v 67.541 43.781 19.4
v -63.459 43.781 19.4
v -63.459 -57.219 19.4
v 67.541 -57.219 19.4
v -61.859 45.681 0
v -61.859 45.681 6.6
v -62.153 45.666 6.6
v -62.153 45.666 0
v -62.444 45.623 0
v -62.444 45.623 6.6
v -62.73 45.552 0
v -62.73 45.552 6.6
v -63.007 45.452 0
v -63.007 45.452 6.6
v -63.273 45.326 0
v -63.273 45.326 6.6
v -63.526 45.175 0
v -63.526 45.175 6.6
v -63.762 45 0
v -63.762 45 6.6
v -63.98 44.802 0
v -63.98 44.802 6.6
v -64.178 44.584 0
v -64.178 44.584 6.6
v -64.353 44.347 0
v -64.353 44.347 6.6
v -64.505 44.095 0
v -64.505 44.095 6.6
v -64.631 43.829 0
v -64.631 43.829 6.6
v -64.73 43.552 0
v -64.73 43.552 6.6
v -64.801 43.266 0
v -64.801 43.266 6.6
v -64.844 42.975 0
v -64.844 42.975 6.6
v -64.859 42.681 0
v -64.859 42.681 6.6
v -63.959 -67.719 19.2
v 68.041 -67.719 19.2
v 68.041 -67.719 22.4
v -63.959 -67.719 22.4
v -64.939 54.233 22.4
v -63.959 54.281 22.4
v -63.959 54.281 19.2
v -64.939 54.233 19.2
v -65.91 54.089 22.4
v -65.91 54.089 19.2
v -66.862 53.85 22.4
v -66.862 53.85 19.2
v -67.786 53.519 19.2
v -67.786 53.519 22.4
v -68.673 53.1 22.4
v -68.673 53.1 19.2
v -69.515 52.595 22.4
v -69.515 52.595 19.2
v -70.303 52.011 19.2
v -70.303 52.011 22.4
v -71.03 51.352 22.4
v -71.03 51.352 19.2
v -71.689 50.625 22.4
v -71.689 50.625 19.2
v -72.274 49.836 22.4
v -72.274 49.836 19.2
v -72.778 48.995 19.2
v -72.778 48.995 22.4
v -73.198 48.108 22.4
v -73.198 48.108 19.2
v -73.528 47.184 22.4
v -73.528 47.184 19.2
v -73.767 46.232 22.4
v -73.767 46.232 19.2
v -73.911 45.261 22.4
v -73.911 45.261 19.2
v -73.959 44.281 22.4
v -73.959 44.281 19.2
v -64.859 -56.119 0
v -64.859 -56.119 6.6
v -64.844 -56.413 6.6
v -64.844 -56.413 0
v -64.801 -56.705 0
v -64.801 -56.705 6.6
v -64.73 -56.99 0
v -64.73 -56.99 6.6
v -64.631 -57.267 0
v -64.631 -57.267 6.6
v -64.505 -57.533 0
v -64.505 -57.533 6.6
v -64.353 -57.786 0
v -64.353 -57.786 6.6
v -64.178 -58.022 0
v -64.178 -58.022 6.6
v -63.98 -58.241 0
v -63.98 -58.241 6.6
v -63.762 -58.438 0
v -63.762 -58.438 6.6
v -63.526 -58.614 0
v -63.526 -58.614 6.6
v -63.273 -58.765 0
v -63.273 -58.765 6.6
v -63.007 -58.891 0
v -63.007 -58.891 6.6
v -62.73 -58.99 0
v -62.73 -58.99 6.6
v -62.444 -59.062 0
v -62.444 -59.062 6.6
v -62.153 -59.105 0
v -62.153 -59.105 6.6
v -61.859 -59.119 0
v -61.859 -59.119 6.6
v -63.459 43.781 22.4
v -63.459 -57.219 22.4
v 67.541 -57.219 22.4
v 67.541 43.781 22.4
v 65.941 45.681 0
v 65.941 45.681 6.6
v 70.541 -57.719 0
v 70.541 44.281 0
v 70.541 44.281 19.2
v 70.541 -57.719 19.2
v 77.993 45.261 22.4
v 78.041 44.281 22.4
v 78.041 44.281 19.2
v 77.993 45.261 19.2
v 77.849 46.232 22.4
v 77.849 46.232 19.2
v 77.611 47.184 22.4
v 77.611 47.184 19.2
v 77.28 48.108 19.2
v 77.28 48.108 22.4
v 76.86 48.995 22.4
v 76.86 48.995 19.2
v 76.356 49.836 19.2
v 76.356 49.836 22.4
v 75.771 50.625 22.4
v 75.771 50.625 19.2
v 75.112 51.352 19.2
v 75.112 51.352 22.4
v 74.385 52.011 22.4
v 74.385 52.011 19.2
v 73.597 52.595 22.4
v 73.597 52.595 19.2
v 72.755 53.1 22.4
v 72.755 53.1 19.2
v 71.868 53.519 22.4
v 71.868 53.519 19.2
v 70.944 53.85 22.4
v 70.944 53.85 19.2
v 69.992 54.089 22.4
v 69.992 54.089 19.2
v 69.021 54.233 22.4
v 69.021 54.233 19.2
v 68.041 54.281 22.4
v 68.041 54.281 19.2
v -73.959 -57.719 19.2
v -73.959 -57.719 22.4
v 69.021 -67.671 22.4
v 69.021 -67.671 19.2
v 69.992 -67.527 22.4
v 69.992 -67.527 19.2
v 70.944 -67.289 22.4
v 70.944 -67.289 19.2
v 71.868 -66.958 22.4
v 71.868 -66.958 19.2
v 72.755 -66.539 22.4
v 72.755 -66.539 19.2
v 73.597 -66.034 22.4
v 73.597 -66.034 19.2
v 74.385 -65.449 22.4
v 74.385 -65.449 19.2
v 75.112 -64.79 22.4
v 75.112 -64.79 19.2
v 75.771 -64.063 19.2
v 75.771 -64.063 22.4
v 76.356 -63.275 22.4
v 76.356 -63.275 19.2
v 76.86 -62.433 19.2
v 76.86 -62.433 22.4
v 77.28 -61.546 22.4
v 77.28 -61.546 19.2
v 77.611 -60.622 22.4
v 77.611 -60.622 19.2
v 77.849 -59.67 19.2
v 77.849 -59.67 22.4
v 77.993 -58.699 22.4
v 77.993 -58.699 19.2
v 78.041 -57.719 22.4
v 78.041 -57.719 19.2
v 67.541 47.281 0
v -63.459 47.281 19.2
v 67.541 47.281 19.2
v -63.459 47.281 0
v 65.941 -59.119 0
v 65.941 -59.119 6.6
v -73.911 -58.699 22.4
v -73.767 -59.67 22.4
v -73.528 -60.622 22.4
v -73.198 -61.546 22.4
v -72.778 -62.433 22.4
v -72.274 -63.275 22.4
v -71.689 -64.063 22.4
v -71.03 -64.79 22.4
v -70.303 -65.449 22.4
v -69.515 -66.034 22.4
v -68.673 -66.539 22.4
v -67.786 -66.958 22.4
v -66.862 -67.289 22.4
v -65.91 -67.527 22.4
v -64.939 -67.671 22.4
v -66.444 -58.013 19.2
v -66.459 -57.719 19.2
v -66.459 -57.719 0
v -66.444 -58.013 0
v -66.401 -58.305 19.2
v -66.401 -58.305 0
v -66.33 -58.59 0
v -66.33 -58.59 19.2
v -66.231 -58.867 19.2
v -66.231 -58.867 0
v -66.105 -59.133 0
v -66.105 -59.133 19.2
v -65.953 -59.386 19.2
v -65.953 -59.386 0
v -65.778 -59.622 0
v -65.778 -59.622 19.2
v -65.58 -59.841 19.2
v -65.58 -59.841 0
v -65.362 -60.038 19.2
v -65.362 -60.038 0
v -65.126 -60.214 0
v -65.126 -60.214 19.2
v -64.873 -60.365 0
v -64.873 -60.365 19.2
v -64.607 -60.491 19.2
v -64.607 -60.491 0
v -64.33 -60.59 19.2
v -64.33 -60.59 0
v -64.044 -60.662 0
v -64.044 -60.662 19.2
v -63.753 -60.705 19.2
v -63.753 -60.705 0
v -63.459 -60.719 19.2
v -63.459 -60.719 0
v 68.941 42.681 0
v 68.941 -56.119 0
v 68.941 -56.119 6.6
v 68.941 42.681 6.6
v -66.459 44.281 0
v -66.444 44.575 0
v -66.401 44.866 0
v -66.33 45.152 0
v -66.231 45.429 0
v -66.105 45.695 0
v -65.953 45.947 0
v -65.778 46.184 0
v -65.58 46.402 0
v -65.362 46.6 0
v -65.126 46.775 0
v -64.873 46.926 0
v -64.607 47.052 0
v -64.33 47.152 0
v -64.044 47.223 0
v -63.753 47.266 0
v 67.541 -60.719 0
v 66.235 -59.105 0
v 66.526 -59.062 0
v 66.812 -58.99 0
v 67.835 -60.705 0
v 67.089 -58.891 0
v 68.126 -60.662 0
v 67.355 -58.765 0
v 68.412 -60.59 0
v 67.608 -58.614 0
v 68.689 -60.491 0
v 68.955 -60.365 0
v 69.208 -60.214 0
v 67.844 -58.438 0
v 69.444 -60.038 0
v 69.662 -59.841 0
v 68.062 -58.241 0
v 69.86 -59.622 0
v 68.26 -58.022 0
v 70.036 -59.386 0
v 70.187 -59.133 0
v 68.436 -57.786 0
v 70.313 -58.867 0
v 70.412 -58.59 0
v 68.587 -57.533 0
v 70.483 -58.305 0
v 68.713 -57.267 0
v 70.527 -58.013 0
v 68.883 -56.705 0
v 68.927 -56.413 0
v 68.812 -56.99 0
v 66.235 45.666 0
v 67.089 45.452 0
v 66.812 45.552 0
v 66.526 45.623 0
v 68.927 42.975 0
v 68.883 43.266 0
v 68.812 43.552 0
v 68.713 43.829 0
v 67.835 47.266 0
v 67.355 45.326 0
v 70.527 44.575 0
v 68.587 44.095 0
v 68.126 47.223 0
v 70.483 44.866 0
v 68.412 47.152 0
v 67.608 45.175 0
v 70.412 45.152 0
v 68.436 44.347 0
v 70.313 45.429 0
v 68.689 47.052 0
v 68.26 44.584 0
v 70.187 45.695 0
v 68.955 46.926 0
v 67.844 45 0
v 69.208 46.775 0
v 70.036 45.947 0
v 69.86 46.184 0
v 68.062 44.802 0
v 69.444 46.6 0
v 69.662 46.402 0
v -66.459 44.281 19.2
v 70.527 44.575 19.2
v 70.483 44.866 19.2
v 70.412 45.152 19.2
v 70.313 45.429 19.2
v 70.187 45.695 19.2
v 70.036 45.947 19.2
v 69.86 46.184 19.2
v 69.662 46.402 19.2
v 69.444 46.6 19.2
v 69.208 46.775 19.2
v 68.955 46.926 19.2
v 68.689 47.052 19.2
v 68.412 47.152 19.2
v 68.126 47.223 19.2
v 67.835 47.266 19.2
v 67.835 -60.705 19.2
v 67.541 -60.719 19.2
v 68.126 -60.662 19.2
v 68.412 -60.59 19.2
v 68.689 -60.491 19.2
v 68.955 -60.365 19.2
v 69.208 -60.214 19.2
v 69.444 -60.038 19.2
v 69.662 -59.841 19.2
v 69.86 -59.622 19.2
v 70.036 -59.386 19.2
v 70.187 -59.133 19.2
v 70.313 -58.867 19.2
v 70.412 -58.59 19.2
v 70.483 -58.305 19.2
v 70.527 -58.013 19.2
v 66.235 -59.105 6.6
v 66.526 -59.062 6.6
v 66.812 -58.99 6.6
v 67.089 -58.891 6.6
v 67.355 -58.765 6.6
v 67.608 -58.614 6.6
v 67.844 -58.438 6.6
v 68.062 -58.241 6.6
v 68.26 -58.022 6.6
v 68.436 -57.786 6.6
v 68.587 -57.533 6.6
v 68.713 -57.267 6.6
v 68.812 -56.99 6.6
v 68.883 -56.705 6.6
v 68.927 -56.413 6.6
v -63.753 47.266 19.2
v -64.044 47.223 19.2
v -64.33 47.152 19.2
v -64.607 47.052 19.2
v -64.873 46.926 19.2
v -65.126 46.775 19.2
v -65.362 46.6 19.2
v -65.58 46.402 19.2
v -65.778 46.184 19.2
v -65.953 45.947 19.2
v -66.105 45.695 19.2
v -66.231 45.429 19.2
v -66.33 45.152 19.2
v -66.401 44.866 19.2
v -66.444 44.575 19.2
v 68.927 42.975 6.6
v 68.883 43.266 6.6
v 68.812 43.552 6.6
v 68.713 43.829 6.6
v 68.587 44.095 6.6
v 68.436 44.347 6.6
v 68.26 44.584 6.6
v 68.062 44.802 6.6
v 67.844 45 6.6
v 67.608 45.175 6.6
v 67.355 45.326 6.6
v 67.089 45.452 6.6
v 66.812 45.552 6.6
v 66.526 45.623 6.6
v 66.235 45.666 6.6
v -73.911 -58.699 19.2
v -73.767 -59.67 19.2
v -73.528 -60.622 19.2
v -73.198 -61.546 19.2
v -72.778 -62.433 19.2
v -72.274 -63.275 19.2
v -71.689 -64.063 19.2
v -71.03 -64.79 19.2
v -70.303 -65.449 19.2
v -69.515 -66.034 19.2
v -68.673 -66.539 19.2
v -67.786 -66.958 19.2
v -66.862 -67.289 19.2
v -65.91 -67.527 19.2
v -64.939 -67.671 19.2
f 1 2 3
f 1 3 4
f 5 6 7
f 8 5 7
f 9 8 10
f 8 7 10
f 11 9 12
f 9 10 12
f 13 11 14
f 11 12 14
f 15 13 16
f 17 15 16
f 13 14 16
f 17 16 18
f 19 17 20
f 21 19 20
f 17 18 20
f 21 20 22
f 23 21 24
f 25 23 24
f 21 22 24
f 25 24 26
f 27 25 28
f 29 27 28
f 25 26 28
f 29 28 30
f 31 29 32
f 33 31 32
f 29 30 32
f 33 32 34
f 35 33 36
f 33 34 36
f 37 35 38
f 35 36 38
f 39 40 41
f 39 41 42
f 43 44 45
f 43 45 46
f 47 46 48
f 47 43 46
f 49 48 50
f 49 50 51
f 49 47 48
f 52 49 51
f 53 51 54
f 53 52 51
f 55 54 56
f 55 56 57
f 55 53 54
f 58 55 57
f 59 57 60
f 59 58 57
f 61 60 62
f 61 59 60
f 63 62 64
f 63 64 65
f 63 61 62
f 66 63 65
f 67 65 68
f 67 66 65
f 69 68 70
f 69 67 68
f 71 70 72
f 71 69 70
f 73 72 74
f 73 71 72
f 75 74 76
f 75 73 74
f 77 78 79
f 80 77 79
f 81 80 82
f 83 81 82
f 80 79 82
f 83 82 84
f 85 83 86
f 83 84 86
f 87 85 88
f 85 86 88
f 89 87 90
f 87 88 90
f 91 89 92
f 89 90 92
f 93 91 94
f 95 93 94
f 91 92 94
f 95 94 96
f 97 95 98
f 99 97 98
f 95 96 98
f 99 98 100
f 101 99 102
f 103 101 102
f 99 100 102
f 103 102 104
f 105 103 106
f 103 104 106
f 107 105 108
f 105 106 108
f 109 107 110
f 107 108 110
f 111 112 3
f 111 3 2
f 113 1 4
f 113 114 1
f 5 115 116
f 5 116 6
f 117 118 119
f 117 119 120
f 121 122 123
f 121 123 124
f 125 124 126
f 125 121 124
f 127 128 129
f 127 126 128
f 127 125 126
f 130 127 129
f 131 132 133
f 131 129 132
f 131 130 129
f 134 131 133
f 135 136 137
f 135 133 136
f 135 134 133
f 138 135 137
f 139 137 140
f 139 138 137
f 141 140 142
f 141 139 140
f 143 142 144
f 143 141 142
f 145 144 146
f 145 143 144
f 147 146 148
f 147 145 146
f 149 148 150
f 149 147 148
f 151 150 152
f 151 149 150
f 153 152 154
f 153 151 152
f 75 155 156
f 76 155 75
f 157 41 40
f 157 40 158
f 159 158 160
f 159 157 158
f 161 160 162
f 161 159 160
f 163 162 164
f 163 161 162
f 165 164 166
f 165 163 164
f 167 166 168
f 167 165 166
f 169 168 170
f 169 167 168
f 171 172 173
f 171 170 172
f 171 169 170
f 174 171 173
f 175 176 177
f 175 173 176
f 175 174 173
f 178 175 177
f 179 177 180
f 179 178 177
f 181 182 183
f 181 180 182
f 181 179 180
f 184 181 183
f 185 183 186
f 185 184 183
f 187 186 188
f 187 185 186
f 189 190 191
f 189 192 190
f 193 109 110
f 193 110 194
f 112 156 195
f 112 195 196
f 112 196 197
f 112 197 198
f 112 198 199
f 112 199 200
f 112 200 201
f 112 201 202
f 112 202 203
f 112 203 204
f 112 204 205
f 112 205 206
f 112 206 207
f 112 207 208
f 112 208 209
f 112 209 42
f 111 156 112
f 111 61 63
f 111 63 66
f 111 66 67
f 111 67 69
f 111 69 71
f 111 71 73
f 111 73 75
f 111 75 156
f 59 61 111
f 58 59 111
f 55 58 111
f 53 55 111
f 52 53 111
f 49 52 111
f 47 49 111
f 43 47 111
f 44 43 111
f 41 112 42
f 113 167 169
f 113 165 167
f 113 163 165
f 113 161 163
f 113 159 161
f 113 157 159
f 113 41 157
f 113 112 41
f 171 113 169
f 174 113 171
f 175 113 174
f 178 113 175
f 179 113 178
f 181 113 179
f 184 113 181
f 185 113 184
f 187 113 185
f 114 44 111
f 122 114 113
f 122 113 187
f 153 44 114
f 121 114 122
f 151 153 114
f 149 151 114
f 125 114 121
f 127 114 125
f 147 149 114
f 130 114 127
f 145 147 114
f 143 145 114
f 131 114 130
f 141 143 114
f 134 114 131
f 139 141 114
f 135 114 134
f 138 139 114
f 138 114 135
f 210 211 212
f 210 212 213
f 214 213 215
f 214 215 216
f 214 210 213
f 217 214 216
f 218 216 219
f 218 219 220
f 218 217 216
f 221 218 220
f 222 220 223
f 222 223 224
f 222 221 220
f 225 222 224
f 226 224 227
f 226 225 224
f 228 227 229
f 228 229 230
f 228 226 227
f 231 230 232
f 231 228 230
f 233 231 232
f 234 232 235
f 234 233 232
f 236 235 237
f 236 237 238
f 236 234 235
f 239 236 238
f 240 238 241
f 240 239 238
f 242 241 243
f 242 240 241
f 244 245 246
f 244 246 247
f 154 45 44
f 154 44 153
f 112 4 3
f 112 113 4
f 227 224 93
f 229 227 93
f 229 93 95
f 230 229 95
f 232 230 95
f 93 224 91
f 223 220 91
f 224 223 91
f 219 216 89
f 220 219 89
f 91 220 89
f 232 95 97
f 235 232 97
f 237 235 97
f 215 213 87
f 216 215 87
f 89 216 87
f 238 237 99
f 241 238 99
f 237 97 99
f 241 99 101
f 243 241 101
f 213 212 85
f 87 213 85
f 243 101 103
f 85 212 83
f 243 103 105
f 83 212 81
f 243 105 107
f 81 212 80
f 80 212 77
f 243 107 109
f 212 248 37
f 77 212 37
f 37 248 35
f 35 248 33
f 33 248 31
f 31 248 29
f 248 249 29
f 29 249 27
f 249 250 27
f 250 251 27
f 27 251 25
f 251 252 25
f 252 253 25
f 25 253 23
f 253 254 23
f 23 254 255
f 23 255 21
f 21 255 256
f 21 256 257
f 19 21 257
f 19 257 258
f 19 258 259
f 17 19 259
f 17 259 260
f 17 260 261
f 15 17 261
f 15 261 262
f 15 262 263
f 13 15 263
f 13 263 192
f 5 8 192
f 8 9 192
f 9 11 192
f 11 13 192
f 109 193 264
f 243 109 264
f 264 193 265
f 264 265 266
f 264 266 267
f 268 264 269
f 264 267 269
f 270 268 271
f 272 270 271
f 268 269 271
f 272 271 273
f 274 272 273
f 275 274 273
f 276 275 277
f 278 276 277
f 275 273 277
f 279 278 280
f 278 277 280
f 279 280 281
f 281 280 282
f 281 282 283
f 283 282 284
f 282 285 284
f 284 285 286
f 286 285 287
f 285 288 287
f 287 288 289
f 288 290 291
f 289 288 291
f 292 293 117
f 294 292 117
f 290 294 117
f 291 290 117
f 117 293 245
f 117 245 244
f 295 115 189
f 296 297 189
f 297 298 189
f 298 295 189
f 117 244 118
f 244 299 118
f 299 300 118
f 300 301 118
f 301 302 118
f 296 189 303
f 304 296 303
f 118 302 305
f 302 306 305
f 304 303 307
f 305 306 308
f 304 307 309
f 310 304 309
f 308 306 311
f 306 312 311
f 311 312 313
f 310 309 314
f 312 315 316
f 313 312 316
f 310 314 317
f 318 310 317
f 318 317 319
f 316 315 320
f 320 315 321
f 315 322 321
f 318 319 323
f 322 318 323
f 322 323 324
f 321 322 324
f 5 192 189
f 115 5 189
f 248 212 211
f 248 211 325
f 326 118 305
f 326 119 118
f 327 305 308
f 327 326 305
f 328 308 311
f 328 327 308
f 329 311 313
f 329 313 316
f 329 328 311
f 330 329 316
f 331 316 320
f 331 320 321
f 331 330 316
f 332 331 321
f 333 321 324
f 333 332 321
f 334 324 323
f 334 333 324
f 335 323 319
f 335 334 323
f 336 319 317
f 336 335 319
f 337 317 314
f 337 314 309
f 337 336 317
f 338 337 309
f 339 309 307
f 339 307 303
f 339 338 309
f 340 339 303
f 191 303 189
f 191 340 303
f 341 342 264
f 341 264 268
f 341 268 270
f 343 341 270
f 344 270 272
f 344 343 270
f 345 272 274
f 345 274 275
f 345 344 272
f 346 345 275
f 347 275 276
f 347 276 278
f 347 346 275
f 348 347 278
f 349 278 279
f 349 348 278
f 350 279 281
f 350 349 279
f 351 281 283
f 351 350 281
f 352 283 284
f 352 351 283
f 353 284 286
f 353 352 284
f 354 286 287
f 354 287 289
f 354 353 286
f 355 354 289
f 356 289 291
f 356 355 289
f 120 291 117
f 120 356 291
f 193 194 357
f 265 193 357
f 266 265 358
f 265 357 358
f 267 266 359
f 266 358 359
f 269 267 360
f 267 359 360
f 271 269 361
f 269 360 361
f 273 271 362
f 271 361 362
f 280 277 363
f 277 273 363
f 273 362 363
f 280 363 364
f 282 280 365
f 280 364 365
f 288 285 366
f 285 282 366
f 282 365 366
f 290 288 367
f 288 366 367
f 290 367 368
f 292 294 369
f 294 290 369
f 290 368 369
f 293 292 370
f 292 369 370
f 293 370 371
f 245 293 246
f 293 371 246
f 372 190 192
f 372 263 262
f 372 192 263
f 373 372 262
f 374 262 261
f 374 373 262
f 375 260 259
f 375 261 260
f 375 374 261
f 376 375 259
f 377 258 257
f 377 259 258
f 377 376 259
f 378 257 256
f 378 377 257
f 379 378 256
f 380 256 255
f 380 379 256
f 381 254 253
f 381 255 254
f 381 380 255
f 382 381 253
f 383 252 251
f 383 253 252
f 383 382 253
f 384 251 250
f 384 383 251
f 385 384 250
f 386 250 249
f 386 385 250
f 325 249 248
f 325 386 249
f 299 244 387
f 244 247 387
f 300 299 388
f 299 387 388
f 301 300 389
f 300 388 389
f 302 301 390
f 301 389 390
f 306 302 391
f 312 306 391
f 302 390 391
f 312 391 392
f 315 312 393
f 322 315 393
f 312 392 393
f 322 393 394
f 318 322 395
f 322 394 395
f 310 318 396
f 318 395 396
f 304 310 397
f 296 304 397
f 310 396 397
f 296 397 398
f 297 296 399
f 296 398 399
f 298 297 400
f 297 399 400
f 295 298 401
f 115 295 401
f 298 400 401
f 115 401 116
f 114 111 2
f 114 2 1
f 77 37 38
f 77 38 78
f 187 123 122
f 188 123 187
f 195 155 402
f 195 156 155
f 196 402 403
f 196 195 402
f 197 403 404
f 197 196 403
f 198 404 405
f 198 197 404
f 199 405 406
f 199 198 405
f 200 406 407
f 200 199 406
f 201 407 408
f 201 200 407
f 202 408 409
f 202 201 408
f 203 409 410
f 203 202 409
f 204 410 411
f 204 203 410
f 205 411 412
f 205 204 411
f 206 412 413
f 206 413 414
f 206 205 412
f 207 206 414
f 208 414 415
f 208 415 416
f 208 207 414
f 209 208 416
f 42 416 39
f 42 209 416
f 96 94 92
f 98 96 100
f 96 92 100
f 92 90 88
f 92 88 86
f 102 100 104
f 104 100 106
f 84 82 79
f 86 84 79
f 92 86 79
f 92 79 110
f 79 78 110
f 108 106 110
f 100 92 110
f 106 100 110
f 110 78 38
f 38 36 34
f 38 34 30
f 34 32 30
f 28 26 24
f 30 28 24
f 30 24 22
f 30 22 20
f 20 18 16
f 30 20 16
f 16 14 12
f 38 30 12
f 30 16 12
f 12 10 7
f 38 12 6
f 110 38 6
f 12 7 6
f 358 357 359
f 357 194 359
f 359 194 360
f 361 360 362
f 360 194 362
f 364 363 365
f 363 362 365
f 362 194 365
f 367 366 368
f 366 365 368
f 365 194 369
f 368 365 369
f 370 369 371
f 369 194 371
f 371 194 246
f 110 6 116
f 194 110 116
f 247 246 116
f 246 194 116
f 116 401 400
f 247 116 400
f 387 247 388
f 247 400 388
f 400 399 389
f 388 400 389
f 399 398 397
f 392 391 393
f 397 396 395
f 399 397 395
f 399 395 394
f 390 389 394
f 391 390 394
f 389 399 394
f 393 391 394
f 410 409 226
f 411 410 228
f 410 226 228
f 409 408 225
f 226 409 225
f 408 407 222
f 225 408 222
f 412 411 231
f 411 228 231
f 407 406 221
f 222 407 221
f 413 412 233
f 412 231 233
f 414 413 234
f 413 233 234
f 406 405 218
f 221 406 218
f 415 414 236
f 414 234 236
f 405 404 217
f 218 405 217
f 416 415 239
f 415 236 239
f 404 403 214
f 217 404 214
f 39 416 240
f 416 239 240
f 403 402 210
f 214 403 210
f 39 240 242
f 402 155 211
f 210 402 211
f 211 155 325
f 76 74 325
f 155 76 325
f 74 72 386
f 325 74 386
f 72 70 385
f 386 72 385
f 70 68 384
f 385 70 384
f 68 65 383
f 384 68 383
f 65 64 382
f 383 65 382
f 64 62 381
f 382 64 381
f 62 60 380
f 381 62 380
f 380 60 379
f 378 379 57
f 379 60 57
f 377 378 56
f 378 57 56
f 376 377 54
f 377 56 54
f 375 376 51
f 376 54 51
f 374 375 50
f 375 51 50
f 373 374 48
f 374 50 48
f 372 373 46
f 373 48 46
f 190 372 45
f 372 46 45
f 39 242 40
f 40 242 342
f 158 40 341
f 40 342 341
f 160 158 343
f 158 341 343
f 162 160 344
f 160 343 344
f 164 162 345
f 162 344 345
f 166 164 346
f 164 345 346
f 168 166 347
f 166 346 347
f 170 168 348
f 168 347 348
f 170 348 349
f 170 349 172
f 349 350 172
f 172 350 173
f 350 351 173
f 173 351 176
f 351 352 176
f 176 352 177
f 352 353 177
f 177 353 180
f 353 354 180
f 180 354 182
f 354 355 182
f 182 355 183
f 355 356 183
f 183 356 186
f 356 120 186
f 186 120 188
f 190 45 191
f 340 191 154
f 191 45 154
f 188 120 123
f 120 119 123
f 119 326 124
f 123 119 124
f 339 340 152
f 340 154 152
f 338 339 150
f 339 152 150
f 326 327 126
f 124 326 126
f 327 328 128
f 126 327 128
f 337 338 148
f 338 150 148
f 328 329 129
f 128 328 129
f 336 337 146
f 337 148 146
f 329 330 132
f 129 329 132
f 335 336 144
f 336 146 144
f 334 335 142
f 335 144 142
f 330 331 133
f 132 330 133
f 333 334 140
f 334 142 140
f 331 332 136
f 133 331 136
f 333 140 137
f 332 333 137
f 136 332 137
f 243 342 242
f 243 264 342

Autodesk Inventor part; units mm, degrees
ref_plane "YZ Plane" through (0, 0, 0) normal (1, 0, 0) x (0, 1, 0)
ref_plane "XZ Plane" through (0, 0, 0) normal (0, 1, 0) x (-1, 0, 0)
ref_plane "XY Plane" through (0, 0, 0) normal (0, 0, 1) x (1, 0, 0)
sketch "Sketch1" plane through (0, 0, 0) normal (0, 0, 1) x (1, 0, 0)
  line L0 (-66.4589, 47.2807) -> (70.5411, 47.2807)
  line L1 (70.5411, 47.2807) -> (70.5411, -60.7193)
  line L2 (70.5411, -60.7193) -> (-66.4589, -60.7193)
  line L3 (-66.4589, -60.7193) -> (-66.4589, 47.2807)
  line L4 (68.9411, 45.6807) -> (-64.8589, 45.6807)
  line L5 (-64.8589, 45.6807) -> (-64.8589, -59.1193)
  line L6 (-64.8589, -59.1193) -> (68.9411, -59.1193)
  line L7 (68.9411, -59.1193) -> (68.9411, 45.6807)
  point P0 (0, 0)
  dimension "d0" = 137
  dimension "d1" = 108
  dimension "d2" = 1.6
extrude "Extrusion1" add sketch "Sketch1" along normal blind 19.2 contours L0 L1 L2 L3 | L7 L6 L5 L4
extrude "Extrusion2" cut sketch "Sketch1" along normal blind 6.6 contours L7 L6 L5 L4
sketch "Sketch2" plane through (0, 0, 19.2) normal (0, 0, 1) x (1, 0, 0)
  line L0 (-73.9589, 54.2807) -> (78.0411, 54.2807)
  line L1 (78.0411, 54.2807) -> (78.0411, -67.7193)
  line L2 (78.0411, -67.7193) -> (-73.9589, -67.7193)
  line L3 (-73.9589, -67.7193) -> (-73.9589, 54.2807)
  line L4 (70.5411, 47.2807) -> (-66.4589, 47.2807) projected
  line L5 (70.5411, -60.7193) -> (70.5411, 47.2807) projected
  point P0 (0, 0)
  dimension "d7" = 152
  dimension "d8" = 122
  dimension "d9" = 7
  dimension "d10" = 7.5
extrude "Extrusion3" add sketch "Sketch2" along normal blind 3.2
fillet "Fillet1" radius 3 8 edges at (70.5411, 47.2807, 9.6) (-66.4589, 47.2807, 9.6) (70.5411, -60.7193, 9.6) (-66.4589, -60.7193, 9.6) (68.9411, 45.6807, 3.3) (-64.8589, 45.6807, 3.3) (68.9411, -59.1193, 3.3) (-64.8589, -59.1193, 3.3)
fillet "Fillet2" radius 10 4 edges at (-73.9589, 54.2807, 20.8) (-73.9589, -67.7193, 20.8) (78.0411, -67.7193, 20.8) (78.0411, 54.2807, 20.8)
sketch "Sketch3" plane through (0, 0, 22.4) normal (0, 0, 1) x (1, 0, 0)
  arc A0 (78.0411, 44.2807) -> (68.0411, 54.2807) centre (68.0411, 44.2807) ccw projected
  line L0 (68.0411, 54.2807) -> (-63.9589, 54.2807) projected
  arc A1 (-63.9589, 54.2807) -> (-73.9589, 44.2807) centre (-63.9589, 44.2807) ccw projected
  line L1 (-73.9589, 44.2807) -> (-73.9589, -57.7193) projected
  arc A2 (-73.9589, -57.7193) -> (-63.9589, -67.7193) centre (-63.9589, -57.7193) ccw projected
  line L2 (-63.9589, -67.7193) -> (68.0411, -67.7193) projected
  arc A3 (68.0411, -67.7193) -> (78.0411, -57.7193) centre (68.0411, -57.7193) ccw projected
  line L3 (78.0411, -57.7193) -> (78.0411, 44.2807) projected
  line L4 (-63.4589, 43.7807) -> (67.5411, 43.7807)
  line L5 (67.5411, 43.7807) -> (67.5411, -57.2193)
  line L6 (67.5411, -57.2193) -> (-63.4589, -57.2193)
  line L7 (-63.4589, -57.2193) -> (-63.4589, 43.7807)
  point P0 (0, 0)
  dimension "d15" = 10.5
extrude "Extrusion4" cut sketch "Sketch3" against normal blind 3 contours L4 L5 L6 L7
equation "\"d9\" = -0.5 * d1 + 0.5 * d8"
equation "\"d10\" = -0.5 * d0 + 0.5 * d7"
properties part number "COTS_Zelmer_108x137mm_HEPA_filter"
